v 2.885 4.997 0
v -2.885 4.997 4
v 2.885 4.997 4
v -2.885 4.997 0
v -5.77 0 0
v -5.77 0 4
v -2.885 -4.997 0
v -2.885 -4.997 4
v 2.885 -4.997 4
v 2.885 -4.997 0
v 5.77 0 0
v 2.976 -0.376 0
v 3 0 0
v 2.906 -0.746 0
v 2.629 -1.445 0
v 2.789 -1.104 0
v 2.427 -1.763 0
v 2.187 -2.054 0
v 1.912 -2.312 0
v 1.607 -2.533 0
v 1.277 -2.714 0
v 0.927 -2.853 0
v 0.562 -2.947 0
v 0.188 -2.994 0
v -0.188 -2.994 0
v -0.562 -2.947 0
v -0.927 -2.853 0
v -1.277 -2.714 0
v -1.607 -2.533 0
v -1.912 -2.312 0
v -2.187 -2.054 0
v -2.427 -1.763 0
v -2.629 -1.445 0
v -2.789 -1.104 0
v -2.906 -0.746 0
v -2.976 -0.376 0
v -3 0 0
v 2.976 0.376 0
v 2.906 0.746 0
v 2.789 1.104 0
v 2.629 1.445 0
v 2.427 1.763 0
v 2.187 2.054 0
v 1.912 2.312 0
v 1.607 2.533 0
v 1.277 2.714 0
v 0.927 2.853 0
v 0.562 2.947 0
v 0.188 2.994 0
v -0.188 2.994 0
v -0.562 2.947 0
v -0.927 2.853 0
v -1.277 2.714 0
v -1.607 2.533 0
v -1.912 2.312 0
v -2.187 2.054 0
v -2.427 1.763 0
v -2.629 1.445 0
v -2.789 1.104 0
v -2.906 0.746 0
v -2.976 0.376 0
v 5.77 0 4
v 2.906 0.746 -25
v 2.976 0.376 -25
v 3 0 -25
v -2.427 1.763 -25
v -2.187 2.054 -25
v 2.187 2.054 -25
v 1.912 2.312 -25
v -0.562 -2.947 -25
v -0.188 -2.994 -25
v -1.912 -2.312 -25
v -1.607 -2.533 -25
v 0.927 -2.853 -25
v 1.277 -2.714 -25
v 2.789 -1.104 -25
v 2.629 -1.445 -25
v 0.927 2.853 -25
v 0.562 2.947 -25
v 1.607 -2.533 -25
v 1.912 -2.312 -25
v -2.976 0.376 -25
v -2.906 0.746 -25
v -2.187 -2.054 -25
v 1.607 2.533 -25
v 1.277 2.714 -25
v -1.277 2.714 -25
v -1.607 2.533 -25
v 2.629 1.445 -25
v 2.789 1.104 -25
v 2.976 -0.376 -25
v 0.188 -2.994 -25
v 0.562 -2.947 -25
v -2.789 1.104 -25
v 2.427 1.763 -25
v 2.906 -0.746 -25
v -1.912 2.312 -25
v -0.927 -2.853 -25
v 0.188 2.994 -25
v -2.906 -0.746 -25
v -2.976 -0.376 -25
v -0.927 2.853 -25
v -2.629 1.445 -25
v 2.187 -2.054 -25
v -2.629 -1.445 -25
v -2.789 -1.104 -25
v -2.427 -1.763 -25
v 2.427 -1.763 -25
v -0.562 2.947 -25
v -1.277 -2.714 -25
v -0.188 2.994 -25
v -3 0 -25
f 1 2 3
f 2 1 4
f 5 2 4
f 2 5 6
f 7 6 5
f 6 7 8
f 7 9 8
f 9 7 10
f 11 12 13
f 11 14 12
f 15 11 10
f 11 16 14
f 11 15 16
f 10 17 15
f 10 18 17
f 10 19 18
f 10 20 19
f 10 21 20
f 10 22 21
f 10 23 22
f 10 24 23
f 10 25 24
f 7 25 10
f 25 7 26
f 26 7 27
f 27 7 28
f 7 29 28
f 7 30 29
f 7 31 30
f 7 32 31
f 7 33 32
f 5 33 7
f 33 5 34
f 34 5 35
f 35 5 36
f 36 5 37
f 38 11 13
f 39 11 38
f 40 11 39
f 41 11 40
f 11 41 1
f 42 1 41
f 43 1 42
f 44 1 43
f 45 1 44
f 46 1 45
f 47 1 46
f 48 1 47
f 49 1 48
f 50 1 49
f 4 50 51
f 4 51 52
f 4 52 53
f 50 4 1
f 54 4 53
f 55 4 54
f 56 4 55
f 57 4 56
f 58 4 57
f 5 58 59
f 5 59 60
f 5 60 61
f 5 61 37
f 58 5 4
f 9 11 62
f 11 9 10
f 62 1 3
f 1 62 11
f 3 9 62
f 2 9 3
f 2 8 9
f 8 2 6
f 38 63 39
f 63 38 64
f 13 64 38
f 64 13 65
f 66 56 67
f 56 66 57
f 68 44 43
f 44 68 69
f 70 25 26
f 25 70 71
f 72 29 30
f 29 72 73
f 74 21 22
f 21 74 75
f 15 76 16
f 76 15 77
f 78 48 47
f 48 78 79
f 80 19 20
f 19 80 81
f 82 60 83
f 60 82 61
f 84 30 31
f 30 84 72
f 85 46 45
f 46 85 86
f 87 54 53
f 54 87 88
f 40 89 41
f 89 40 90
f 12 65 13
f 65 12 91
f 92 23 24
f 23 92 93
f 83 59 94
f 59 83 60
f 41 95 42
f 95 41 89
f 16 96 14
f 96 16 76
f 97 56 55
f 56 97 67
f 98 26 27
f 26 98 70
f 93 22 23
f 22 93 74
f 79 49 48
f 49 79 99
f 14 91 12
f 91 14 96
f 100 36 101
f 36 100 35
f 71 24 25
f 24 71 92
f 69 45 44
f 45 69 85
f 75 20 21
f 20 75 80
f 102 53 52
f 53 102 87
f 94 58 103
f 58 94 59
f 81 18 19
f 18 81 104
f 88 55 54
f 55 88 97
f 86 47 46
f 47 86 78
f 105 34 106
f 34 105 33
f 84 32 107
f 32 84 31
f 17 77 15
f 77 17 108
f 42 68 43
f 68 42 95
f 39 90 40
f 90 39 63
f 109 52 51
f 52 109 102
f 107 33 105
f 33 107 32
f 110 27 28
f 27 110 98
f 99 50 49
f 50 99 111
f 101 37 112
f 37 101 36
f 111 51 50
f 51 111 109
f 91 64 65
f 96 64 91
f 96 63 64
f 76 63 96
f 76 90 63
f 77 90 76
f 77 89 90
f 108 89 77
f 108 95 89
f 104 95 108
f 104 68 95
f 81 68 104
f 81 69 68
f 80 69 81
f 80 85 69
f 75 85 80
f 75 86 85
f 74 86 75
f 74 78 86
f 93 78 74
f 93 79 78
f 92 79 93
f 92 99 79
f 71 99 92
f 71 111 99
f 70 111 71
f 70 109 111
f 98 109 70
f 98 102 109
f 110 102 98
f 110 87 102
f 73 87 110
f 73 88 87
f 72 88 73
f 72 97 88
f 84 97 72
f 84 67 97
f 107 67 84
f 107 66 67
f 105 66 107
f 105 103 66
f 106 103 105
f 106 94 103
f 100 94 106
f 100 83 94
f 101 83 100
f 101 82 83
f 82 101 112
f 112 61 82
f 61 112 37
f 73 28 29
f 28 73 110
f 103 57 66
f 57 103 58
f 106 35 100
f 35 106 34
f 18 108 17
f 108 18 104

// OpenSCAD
$fn = 50;


difference() {
	union() {
		translate(v = [0, 0, 0]) {
			rotate(a = [0, 0, 0]) {
				translate(v = [0, 0, 0]) {
					rotate(a = [0, 0, 0]) {
						linear_extrude(height = 4) {
							polygon(points = [[5.7700000000, 0.0000000000], [2.8850000000, 4.9969665798], [-2.8850000000, 4.9969665798], [-5.7700000000, 0.0000000000], [-2.8850000000, -4.9969665798], [2.8850000000, -4.9969665798]]);
						}
					}
				}
			}
		}
		translate(v = [0, 0, -25]) {
			rotate(a = [0, 0, 0]) {
				cylinder(h = 25, r = 3.0000000000);
			}
		}
	}
	union();
}
